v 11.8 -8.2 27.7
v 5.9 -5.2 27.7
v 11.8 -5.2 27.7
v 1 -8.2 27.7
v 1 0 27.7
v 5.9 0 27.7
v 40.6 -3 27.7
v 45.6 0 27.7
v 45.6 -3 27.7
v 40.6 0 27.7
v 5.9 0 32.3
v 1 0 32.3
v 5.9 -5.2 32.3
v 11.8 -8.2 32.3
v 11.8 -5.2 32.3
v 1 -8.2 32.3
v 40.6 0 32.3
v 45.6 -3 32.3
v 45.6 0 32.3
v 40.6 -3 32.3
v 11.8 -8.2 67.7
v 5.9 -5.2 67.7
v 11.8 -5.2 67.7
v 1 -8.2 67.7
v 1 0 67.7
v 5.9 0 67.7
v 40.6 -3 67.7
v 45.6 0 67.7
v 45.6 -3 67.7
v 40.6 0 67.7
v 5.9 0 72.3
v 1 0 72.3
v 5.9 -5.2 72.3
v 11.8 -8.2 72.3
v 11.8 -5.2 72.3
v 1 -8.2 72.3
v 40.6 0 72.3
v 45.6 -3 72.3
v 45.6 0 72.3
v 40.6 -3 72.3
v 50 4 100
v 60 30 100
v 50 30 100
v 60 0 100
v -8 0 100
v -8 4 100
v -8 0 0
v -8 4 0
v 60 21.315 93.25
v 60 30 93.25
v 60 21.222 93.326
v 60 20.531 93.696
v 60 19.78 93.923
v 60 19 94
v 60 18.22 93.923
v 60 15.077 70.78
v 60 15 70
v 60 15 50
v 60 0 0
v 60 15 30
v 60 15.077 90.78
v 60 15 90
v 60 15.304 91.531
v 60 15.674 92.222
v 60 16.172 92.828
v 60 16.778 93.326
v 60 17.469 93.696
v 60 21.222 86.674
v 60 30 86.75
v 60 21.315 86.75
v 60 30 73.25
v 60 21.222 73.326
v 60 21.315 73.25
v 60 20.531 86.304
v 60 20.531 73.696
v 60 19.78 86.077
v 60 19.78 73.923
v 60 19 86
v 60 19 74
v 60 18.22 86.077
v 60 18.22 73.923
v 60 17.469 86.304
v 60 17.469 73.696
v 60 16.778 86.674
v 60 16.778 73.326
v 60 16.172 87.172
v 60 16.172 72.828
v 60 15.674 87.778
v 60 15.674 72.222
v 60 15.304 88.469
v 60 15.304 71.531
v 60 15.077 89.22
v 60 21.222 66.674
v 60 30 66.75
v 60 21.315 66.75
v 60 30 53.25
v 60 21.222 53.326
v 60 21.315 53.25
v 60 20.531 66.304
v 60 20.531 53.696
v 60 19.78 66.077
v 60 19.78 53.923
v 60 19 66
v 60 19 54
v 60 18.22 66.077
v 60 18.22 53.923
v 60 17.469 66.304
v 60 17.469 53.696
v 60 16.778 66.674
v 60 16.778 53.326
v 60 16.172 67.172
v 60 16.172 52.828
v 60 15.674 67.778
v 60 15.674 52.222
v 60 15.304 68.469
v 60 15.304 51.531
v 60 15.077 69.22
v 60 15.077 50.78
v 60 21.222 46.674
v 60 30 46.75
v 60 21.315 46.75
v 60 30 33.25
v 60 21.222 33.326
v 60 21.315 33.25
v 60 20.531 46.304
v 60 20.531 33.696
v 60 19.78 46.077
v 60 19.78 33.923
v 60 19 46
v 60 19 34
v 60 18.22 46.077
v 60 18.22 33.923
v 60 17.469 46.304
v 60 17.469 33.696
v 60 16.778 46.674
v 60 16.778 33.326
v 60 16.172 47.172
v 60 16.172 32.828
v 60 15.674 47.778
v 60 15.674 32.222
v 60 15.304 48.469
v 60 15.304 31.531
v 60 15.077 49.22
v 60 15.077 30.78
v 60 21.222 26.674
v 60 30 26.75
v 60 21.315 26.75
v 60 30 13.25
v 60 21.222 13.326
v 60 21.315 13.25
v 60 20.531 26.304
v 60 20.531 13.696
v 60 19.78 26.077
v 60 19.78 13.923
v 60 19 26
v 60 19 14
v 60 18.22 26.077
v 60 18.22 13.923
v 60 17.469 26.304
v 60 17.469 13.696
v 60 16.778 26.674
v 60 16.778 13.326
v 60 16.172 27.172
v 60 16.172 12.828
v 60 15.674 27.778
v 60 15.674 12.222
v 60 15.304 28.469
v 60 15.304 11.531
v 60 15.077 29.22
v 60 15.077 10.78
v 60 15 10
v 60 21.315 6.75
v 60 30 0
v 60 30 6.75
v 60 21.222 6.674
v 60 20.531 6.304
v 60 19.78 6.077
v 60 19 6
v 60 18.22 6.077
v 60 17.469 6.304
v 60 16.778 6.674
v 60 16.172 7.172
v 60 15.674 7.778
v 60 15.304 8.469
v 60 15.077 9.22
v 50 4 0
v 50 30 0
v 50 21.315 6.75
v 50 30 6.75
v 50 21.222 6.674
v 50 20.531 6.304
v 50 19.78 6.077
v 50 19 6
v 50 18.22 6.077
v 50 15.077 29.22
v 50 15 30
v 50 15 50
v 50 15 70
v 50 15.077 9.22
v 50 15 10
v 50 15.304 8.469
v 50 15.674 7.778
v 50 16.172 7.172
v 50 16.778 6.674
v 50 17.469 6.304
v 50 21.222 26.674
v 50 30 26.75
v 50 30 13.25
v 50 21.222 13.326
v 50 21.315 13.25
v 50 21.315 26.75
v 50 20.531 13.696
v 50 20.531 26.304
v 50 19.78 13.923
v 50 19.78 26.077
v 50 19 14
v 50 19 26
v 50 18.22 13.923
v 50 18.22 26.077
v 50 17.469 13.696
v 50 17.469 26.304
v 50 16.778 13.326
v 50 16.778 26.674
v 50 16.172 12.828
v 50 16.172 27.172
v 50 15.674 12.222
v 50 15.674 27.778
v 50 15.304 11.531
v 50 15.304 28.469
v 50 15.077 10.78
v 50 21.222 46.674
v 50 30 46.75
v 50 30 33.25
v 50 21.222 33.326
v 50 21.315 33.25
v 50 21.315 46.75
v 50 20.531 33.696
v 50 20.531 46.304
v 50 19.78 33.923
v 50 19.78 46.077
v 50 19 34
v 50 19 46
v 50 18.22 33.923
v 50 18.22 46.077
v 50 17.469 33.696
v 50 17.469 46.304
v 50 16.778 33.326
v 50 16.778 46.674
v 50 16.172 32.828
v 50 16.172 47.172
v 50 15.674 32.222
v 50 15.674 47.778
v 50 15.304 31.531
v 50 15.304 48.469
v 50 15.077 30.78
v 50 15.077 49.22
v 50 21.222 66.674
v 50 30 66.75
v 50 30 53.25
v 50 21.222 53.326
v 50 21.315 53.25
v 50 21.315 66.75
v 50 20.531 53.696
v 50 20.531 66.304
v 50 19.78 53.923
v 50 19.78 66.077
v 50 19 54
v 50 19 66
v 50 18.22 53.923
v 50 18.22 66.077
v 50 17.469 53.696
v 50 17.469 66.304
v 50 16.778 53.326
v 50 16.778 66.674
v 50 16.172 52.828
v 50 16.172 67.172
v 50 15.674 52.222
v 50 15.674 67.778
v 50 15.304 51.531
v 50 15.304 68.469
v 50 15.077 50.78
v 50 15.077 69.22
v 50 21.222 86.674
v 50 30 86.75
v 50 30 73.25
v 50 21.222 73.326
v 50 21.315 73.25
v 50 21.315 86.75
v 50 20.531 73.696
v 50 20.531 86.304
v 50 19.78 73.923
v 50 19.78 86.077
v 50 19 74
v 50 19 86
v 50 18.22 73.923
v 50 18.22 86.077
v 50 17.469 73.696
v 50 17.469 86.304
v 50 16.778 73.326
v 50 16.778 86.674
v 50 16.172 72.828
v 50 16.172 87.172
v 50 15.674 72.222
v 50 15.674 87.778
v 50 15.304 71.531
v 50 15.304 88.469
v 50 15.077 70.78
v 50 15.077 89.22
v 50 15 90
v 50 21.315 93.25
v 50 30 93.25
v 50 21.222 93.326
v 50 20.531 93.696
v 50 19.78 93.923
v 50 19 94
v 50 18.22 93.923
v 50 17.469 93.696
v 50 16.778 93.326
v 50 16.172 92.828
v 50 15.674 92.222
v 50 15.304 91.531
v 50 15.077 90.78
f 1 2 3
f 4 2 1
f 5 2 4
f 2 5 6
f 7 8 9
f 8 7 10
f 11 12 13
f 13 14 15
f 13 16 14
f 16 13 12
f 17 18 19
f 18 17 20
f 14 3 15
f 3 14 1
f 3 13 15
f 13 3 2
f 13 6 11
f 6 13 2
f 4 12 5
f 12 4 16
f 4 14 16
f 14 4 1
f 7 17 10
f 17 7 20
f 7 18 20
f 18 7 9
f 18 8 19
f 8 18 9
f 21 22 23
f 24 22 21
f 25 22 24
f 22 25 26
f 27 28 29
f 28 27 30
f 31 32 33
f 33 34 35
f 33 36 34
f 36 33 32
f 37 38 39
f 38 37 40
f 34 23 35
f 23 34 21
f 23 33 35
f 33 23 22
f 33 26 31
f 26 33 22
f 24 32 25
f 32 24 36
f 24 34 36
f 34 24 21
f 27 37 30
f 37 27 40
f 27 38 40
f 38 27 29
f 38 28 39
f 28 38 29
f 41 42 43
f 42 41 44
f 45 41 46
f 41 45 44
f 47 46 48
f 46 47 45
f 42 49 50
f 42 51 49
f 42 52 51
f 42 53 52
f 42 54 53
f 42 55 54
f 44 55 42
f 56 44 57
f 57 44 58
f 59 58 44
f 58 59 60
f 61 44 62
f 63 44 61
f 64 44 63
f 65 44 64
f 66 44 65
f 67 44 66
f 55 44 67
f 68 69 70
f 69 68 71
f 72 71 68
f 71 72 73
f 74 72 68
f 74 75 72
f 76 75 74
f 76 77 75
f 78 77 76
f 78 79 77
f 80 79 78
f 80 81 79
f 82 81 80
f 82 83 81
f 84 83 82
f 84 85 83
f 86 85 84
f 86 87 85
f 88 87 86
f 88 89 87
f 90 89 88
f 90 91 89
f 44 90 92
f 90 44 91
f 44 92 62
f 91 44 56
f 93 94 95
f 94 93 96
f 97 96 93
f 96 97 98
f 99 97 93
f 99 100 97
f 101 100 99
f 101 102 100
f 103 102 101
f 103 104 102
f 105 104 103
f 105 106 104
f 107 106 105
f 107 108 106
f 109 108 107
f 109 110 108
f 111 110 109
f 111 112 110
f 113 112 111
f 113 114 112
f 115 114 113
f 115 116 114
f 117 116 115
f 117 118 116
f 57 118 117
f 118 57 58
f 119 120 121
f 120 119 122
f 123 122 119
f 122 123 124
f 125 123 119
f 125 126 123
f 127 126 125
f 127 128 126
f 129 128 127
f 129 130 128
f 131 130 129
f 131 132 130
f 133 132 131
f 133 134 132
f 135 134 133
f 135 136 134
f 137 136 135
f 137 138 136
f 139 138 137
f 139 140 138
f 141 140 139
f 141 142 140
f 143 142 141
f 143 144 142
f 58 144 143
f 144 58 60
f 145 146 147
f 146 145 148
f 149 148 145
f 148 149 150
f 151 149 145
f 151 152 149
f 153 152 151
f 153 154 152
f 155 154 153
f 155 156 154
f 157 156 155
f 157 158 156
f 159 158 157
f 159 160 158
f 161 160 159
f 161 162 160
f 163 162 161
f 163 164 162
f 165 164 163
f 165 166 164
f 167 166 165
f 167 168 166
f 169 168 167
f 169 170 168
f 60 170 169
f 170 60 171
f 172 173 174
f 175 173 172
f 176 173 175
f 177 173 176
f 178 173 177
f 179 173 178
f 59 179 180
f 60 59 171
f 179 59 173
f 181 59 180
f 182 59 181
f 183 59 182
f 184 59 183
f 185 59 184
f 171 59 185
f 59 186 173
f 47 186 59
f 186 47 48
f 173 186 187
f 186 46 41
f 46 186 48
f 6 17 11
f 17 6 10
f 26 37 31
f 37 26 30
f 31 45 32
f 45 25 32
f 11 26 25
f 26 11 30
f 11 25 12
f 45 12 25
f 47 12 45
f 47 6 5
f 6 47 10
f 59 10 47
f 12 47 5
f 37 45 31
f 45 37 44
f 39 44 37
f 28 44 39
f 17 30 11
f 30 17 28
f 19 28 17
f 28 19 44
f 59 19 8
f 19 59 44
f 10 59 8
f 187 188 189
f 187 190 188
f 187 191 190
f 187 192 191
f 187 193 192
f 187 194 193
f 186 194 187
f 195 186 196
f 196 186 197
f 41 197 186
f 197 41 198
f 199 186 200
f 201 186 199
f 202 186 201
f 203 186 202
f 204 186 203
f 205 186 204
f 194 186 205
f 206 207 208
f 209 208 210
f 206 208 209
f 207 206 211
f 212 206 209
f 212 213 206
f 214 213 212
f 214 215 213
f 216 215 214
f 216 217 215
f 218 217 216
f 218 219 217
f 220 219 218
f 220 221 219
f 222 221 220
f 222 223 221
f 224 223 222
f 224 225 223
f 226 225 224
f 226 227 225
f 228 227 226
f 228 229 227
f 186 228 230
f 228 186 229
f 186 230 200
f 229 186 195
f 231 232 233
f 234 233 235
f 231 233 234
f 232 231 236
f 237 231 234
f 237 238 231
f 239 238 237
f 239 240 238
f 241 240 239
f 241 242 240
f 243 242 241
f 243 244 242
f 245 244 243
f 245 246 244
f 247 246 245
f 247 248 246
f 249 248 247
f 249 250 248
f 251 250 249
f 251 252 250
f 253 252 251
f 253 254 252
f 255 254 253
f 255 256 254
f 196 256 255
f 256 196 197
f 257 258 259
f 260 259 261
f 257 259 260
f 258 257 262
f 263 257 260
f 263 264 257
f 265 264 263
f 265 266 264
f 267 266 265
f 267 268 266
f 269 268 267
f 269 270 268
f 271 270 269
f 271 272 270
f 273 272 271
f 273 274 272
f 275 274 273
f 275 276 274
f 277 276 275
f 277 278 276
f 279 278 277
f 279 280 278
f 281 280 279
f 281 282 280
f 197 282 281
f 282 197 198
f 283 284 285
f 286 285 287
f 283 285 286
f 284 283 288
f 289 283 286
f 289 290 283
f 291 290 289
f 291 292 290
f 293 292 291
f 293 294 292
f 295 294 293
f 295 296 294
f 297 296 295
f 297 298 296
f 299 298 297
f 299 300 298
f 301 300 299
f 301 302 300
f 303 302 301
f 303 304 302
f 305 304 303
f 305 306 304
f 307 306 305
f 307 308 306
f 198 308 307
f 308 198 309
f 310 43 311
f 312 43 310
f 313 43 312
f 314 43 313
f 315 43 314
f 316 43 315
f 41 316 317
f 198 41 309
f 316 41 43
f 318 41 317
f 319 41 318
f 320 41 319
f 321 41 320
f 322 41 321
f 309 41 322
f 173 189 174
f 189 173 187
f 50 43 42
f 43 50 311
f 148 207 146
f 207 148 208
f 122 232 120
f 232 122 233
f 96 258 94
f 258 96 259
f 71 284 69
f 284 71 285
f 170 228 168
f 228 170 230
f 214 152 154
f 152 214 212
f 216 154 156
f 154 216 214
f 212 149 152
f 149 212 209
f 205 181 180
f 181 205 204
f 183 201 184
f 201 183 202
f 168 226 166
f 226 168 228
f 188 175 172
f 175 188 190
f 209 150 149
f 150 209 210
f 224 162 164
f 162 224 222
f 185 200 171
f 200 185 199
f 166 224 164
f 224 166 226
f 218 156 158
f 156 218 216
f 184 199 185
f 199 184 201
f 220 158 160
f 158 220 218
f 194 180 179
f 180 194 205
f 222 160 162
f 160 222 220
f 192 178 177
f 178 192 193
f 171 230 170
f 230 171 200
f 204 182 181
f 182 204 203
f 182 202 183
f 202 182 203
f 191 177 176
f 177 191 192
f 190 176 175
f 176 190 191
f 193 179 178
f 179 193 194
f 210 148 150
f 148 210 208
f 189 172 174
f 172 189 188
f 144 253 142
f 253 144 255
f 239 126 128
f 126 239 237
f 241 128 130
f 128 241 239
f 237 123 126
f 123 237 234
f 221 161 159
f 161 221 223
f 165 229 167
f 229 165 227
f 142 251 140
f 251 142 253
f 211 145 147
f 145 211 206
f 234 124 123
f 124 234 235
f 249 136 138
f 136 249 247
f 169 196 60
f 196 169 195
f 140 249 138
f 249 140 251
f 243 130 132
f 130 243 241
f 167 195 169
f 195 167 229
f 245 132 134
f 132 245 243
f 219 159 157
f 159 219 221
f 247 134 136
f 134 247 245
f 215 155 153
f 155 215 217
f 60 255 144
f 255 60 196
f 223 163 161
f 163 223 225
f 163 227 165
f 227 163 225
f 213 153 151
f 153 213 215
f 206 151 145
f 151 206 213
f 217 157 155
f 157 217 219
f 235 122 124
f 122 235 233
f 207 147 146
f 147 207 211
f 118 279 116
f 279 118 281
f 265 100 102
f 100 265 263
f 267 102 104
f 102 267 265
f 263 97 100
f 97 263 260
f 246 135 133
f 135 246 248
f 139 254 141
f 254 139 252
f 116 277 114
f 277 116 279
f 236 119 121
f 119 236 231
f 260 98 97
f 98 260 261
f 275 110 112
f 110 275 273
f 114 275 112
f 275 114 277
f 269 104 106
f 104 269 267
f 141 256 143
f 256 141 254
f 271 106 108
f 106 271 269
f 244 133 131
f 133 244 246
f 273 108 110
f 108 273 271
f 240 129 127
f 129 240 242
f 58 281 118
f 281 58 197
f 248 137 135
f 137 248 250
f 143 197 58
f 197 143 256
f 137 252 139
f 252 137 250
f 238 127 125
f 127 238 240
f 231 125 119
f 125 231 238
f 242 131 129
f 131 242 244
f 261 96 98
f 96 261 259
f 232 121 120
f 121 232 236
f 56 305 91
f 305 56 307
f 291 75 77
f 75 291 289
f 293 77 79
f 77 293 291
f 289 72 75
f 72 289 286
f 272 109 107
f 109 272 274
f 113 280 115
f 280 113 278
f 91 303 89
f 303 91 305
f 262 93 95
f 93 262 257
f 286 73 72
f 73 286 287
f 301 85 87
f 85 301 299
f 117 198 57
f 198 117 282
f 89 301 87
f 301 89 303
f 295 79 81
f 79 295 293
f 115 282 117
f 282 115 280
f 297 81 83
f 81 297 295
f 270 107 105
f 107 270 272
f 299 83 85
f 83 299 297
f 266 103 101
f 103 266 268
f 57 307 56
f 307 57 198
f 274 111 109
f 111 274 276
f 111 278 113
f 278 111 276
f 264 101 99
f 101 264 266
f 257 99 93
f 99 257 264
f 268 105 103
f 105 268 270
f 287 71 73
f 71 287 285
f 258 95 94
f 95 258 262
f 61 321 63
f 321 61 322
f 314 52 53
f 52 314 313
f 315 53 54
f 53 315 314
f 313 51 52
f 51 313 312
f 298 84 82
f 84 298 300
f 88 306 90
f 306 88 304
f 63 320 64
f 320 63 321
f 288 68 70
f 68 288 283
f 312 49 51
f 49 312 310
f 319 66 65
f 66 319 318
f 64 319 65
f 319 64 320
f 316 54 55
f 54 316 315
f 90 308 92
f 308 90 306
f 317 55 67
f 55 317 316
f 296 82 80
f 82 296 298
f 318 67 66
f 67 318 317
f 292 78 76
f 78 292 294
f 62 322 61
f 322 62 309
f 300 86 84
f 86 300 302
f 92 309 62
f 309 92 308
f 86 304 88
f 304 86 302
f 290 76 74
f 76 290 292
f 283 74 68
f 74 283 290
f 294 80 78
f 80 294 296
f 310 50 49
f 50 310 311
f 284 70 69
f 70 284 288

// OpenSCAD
// file: skadis-lib.scad
// Shared pieces for the SKÅDIS accessories. Not printed on its own.
//
// Frame for an accessory: the board's FRONT face is the plane y = 0 (the board fills
// y -5..0), x runs across the board, z up, and z = 0 is the centre of the slot the upper
// hanger uses. Every accessory is built in this frame and saved with as_print(), which lays
// it on its side (x becomes the print's z), so the hangers print with their layers running
// along the lip and nothing needs support.
//
// The hanger is IKEA's own way of holding on, proven on skadis-hook.scad: a 4.6 mm wide tab
// goes through a slot and a lip behind the board drops 5.9 mm below the slot; a short peg
// sits in the slot 40 mm below so the piece cannot tip, swing or lift by accident. Lift it
// 6 mm to take it off. Two hangers 40 mm apart (two slots of one row) carry anything heavy.
//
// Profile (u out from the front face, v up from the upper slot's centre), dropped position:
//   tab  u -5.2..0,    v -5.9..-1    rests on the slot's rounded bottom (-5.98 for a 4.6 tab)
//   lip  u -8.2..-5.2, v -11.8..-1   5.8 mm of board behind it
//   peg  u -3..0,      v -45.6..-40.6
// Raised 5.9 for fitting, the tab and lip (10.8 tall) pass the slot, whose straight height
// for a 4.6 mm part is 11.96; the peg stays inside the lower slot (usable -45.98..-34.02).

hanger_w = 4.6;
hanger_drop = 5.9;
hanger_bottom = -45.6;        // the lowest point of a hanger (the peg's bottom)
key_len = 13; key_neck = 5; key_tip = 11; key_depth = 3.5;
key_poly = [[-key_len / 2, -key_tip / 2], [-key_len / 2, key_tip / 2], [0, key_neck / 2], [key_len / 2, key_tip / 2], [key_len / 2, -key_tip / 2], [0, -key_neck / 2]];

module hanger2d() {
    translate([-5.2, -5.9]) square([5.2 + 0.01, 4.9]);
    translate([-8.2, -11.8]) square([3, 10.8]);
    translate([-3, -45.6]) square([3 + 0.01, 5]);
}
// extrude a 2D (u, v) profile along x, from x0 to x0 + w
module along_x(x0, w) multmatrix([[0, 0, 1, x0], [1, 0, 0, 0], [0, 1, 0, 0], [0, 0, 0, 1]]) linear_extrude(w) children();
module hanger(x) along_x(x - hanger_w / 2, hanger_w) hanger2d();
module hangers(xs) for (x = xs) hanger(x);
// a slab from the front face: u 0..t, v v0..v1, x x0..x1 (the spine that sits on the board)
module spine(x0, x1, v0, v1, t = 4) translate([x0, 0, v0]) cube([x1 - x0, t, v1 - v0]);
// lay the finished accessory on its side for printing: x up, lying on its x = 0 face
module as_print() rotate([0, -90, 0]) children();
// rounded 2D rectangle, for arms and lips
module rr(w, h, r) offset(r = r, $fn = 24) offset(delta = -r) square([w, h]);
// main file
// Cable comb for the SKÅDIS board: five 8 mm fingers with a 6.5 mm neck, so a charging lead
// clips in from the front and stays. 100 wide, two hangers. Print on the side, as saved,
// PETG, 4 walls, 30 %. x1
//   openscad -o skadis-cable-comb-x1.stl skadis-cable-comb.scad

include <skadis-lib.scad>

W = 100; D = 26; t = 10; spine_t = 4; n = 5; hole = 8; neck = 6.5;
v_top = -50;
hx = [W / 2 - 20, W / 2 + 20];

module piece() {
    difference() {
        union() {
            hangers(hx);
            spine(0, W, v_top - t, 8, spine_t);
            translate([0, 0, v_top - t]) cube([W, spine_t + D, t]);
        }
        for (i = [0 : n - 1]) let (x = W / (2 * n) * (2 * i + 1)) {
            translate([x, spine_t + D - 11, v_top - t - 1]) cylinder(d = hole, h = t + 2, $fn = 32);
            translate([x - neck / 2, spine_t + D - 11, v_top - t - 1]) cube([neck, 12, t + 2]);
        }
    }
}
as_print() piece();
